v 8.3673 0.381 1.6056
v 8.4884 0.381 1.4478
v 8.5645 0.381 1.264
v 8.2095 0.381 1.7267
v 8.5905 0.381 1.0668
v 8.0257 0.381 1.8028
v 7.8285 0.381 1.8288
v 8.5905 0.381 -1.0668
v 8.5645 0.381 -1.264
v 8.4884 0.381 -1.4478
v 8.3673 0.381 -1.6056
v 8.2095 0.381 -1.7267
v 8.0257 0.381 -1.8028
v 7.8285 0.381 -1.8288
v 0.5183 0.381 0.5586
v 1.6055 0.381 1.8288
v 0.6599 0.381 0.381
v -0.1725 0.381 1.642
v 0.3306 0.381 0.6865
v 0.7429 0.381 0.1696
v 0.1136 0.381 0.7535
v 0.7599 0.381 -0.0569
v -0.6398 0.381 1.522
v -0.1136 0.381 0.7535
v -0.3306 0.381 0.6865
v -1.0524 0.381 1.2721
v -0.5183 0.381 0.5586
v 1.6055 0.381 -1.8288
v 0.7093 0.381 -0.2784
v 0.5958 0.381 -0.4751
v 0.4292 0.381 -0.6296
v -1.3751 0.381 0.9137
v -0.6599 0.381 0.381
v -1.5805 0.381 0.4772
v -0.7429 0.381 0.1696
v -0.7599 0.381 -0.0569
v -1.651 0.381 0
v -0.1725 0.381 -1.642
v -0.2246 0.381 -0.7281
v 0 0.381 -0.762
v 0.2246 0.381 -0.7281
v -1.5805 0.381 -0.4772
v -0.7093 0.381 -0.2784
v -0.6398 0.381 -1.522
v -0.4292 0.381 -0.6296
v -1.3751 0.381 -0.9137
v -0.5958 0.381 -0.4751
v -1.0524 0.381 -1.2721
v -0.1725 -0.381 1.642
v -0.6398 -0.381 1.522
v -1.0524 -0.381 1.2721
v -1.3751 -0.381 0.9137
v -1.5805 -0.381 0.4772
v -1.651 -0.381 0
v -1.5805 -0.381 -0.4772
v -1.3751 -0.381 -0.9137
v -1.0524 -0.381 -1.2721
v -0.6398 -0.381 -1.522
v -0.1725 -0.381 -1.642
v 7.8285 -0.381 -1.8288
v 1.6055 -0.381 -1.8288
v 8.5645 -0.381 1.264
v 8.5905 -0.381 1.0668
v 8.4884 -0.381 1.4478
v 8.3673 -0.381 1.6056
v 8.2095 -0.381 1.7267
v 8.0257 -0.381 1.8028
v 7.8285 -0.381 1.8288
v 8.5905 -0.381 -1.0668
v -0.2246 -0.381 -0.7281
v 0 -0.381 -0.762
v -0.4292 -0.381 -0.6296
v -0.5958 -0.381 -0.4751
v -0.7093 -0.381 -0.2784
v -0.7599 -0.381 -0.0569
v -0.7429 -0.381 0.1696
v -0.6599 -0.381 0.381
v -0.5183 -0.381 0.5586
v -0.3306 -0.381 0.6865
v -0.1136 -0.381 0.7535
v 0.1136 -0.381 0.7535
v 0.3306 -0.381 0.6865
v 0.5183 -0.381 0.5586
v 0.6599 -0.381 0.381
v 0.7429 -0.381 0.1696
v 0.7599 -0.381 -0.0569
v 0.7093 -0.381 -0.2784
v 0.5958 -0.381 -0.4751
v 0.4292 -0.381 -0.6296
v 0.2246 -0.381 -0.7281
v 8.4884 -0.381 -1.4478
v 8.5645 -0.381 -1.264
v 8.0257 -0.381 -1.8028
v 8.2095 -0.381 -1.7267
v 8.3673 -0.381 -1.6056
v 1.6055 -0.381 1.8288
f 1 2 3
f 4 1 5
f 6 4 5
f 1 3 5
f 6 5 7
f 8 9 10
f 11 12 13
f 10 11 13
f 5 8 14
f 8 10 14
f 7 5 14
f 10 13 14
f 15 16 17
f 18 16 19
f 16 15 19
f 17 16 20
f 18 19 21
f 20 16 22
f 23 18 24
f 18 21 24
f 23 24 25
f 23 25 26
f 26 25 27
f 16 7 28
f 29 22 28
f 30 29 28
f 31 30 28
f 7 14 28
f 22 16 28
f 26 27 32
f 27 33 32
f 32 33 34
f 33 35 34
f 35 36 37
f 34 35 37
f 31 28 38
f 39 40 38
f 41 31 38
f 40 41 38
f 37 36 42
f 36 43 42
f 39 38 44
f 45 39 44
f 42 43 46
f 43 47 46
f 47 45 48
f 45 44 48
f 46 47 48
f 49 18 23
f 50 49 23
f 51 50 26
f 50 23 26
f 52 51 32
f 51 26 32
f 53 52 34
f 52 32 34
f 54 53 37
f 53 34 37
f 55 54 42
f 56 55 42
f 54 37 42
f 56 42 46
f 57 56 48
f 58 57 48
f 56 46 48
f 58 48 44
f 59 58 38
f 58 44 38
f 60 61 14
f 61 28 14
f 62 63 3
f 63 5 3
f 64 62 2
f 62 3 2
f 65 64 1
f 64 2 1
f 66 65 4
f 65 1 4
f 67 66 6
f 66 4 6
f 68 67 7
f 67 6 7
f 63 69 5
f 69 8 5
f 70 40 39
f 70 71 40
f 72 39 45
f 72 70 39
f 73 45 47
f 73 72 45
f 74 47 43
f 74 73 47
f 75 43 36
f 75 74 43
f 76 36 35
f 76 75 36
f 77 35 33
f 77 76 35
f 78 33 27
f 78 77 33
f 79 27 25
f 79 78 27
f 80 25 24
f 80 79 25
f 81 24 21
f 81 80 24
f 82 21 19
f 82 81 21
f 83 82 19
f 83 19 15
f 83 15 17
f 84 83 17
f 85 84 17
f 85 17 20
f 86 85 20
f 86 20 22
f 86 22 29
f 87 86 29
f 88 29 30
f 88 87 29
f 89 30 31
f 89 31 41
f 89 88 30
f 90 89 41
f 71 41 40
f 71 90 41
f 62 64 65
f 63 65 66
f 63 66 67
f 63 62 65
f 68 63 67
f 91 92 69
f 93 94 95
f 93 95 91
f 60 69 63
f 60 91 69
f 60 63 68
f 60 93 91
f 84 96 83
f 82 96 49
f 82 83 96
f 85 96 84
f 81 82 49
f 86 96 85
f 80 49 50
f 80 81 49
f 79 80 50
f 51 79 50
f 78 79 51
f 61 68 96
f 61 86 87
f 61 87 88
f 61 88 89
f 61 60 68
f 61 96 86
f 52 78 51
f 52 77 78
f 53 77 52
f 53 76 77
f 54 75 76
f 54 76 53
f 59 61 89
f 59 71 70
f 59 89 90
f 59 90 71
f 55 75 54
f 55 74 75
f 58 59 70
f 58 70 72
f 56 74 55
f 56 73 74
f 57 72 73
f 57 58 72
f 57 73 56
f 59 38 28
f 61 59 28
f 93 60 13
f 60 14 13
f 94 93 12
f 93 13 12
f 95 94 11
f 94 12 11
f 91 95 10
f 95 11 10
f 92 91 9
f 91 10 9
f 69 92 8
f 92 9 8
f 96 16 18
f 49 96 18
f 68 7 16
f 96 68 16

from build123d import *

# Parameters (mm, degrees)
SKETCH1_R           = 0.762
BOSS_EXTRUDE1_DEPTH = 0.381


with BuildPart() as part:
    # Sketch1 → Boss-Extrude1 (new, symmetric)
    with BuildSketch(Plane(origin=(0, 0, 0), x_dir=(1, 0, 0), z_dir=(0, 1, 0))):
        with BuildLine():
            Line((-0.172545192, 1.641958939), (1.605454808, 1.8288))
            Line((1.605454808, 1.8288), (7.828454808, 1.8288))
            ThreePointArc((7.828454808, 1.8288), (8.367270176, 1.605615367), (8.590454808, 1.0668))
            Line((8.590454808, 1.0668), (8.590454808, -1.0668))
            ThreePointArc((8.590454808, -1.0668), (8.367270176, -1.605615367), (7.828454808, -1.8288))
            Line((7.828454808, -1.8288), (1.605454808, -1.8288))
            Line((1.605454808, -1.8288), (-0.172545192, -1.641958939))
            ThreePointArc((-0.172545192, -1.641958939), (-1.651, 0), (-0.172545192, 1.641958939))
        make_face()
        with Locations(Location((0, 0, 0), (0, 0, 90))):
            Circle(SKETCH1_R, mode=Mode.SUBTRACT)
    extrude(amount=BOSS_EXTRUDE1_DEPTH, both=True)


solid = part.part
